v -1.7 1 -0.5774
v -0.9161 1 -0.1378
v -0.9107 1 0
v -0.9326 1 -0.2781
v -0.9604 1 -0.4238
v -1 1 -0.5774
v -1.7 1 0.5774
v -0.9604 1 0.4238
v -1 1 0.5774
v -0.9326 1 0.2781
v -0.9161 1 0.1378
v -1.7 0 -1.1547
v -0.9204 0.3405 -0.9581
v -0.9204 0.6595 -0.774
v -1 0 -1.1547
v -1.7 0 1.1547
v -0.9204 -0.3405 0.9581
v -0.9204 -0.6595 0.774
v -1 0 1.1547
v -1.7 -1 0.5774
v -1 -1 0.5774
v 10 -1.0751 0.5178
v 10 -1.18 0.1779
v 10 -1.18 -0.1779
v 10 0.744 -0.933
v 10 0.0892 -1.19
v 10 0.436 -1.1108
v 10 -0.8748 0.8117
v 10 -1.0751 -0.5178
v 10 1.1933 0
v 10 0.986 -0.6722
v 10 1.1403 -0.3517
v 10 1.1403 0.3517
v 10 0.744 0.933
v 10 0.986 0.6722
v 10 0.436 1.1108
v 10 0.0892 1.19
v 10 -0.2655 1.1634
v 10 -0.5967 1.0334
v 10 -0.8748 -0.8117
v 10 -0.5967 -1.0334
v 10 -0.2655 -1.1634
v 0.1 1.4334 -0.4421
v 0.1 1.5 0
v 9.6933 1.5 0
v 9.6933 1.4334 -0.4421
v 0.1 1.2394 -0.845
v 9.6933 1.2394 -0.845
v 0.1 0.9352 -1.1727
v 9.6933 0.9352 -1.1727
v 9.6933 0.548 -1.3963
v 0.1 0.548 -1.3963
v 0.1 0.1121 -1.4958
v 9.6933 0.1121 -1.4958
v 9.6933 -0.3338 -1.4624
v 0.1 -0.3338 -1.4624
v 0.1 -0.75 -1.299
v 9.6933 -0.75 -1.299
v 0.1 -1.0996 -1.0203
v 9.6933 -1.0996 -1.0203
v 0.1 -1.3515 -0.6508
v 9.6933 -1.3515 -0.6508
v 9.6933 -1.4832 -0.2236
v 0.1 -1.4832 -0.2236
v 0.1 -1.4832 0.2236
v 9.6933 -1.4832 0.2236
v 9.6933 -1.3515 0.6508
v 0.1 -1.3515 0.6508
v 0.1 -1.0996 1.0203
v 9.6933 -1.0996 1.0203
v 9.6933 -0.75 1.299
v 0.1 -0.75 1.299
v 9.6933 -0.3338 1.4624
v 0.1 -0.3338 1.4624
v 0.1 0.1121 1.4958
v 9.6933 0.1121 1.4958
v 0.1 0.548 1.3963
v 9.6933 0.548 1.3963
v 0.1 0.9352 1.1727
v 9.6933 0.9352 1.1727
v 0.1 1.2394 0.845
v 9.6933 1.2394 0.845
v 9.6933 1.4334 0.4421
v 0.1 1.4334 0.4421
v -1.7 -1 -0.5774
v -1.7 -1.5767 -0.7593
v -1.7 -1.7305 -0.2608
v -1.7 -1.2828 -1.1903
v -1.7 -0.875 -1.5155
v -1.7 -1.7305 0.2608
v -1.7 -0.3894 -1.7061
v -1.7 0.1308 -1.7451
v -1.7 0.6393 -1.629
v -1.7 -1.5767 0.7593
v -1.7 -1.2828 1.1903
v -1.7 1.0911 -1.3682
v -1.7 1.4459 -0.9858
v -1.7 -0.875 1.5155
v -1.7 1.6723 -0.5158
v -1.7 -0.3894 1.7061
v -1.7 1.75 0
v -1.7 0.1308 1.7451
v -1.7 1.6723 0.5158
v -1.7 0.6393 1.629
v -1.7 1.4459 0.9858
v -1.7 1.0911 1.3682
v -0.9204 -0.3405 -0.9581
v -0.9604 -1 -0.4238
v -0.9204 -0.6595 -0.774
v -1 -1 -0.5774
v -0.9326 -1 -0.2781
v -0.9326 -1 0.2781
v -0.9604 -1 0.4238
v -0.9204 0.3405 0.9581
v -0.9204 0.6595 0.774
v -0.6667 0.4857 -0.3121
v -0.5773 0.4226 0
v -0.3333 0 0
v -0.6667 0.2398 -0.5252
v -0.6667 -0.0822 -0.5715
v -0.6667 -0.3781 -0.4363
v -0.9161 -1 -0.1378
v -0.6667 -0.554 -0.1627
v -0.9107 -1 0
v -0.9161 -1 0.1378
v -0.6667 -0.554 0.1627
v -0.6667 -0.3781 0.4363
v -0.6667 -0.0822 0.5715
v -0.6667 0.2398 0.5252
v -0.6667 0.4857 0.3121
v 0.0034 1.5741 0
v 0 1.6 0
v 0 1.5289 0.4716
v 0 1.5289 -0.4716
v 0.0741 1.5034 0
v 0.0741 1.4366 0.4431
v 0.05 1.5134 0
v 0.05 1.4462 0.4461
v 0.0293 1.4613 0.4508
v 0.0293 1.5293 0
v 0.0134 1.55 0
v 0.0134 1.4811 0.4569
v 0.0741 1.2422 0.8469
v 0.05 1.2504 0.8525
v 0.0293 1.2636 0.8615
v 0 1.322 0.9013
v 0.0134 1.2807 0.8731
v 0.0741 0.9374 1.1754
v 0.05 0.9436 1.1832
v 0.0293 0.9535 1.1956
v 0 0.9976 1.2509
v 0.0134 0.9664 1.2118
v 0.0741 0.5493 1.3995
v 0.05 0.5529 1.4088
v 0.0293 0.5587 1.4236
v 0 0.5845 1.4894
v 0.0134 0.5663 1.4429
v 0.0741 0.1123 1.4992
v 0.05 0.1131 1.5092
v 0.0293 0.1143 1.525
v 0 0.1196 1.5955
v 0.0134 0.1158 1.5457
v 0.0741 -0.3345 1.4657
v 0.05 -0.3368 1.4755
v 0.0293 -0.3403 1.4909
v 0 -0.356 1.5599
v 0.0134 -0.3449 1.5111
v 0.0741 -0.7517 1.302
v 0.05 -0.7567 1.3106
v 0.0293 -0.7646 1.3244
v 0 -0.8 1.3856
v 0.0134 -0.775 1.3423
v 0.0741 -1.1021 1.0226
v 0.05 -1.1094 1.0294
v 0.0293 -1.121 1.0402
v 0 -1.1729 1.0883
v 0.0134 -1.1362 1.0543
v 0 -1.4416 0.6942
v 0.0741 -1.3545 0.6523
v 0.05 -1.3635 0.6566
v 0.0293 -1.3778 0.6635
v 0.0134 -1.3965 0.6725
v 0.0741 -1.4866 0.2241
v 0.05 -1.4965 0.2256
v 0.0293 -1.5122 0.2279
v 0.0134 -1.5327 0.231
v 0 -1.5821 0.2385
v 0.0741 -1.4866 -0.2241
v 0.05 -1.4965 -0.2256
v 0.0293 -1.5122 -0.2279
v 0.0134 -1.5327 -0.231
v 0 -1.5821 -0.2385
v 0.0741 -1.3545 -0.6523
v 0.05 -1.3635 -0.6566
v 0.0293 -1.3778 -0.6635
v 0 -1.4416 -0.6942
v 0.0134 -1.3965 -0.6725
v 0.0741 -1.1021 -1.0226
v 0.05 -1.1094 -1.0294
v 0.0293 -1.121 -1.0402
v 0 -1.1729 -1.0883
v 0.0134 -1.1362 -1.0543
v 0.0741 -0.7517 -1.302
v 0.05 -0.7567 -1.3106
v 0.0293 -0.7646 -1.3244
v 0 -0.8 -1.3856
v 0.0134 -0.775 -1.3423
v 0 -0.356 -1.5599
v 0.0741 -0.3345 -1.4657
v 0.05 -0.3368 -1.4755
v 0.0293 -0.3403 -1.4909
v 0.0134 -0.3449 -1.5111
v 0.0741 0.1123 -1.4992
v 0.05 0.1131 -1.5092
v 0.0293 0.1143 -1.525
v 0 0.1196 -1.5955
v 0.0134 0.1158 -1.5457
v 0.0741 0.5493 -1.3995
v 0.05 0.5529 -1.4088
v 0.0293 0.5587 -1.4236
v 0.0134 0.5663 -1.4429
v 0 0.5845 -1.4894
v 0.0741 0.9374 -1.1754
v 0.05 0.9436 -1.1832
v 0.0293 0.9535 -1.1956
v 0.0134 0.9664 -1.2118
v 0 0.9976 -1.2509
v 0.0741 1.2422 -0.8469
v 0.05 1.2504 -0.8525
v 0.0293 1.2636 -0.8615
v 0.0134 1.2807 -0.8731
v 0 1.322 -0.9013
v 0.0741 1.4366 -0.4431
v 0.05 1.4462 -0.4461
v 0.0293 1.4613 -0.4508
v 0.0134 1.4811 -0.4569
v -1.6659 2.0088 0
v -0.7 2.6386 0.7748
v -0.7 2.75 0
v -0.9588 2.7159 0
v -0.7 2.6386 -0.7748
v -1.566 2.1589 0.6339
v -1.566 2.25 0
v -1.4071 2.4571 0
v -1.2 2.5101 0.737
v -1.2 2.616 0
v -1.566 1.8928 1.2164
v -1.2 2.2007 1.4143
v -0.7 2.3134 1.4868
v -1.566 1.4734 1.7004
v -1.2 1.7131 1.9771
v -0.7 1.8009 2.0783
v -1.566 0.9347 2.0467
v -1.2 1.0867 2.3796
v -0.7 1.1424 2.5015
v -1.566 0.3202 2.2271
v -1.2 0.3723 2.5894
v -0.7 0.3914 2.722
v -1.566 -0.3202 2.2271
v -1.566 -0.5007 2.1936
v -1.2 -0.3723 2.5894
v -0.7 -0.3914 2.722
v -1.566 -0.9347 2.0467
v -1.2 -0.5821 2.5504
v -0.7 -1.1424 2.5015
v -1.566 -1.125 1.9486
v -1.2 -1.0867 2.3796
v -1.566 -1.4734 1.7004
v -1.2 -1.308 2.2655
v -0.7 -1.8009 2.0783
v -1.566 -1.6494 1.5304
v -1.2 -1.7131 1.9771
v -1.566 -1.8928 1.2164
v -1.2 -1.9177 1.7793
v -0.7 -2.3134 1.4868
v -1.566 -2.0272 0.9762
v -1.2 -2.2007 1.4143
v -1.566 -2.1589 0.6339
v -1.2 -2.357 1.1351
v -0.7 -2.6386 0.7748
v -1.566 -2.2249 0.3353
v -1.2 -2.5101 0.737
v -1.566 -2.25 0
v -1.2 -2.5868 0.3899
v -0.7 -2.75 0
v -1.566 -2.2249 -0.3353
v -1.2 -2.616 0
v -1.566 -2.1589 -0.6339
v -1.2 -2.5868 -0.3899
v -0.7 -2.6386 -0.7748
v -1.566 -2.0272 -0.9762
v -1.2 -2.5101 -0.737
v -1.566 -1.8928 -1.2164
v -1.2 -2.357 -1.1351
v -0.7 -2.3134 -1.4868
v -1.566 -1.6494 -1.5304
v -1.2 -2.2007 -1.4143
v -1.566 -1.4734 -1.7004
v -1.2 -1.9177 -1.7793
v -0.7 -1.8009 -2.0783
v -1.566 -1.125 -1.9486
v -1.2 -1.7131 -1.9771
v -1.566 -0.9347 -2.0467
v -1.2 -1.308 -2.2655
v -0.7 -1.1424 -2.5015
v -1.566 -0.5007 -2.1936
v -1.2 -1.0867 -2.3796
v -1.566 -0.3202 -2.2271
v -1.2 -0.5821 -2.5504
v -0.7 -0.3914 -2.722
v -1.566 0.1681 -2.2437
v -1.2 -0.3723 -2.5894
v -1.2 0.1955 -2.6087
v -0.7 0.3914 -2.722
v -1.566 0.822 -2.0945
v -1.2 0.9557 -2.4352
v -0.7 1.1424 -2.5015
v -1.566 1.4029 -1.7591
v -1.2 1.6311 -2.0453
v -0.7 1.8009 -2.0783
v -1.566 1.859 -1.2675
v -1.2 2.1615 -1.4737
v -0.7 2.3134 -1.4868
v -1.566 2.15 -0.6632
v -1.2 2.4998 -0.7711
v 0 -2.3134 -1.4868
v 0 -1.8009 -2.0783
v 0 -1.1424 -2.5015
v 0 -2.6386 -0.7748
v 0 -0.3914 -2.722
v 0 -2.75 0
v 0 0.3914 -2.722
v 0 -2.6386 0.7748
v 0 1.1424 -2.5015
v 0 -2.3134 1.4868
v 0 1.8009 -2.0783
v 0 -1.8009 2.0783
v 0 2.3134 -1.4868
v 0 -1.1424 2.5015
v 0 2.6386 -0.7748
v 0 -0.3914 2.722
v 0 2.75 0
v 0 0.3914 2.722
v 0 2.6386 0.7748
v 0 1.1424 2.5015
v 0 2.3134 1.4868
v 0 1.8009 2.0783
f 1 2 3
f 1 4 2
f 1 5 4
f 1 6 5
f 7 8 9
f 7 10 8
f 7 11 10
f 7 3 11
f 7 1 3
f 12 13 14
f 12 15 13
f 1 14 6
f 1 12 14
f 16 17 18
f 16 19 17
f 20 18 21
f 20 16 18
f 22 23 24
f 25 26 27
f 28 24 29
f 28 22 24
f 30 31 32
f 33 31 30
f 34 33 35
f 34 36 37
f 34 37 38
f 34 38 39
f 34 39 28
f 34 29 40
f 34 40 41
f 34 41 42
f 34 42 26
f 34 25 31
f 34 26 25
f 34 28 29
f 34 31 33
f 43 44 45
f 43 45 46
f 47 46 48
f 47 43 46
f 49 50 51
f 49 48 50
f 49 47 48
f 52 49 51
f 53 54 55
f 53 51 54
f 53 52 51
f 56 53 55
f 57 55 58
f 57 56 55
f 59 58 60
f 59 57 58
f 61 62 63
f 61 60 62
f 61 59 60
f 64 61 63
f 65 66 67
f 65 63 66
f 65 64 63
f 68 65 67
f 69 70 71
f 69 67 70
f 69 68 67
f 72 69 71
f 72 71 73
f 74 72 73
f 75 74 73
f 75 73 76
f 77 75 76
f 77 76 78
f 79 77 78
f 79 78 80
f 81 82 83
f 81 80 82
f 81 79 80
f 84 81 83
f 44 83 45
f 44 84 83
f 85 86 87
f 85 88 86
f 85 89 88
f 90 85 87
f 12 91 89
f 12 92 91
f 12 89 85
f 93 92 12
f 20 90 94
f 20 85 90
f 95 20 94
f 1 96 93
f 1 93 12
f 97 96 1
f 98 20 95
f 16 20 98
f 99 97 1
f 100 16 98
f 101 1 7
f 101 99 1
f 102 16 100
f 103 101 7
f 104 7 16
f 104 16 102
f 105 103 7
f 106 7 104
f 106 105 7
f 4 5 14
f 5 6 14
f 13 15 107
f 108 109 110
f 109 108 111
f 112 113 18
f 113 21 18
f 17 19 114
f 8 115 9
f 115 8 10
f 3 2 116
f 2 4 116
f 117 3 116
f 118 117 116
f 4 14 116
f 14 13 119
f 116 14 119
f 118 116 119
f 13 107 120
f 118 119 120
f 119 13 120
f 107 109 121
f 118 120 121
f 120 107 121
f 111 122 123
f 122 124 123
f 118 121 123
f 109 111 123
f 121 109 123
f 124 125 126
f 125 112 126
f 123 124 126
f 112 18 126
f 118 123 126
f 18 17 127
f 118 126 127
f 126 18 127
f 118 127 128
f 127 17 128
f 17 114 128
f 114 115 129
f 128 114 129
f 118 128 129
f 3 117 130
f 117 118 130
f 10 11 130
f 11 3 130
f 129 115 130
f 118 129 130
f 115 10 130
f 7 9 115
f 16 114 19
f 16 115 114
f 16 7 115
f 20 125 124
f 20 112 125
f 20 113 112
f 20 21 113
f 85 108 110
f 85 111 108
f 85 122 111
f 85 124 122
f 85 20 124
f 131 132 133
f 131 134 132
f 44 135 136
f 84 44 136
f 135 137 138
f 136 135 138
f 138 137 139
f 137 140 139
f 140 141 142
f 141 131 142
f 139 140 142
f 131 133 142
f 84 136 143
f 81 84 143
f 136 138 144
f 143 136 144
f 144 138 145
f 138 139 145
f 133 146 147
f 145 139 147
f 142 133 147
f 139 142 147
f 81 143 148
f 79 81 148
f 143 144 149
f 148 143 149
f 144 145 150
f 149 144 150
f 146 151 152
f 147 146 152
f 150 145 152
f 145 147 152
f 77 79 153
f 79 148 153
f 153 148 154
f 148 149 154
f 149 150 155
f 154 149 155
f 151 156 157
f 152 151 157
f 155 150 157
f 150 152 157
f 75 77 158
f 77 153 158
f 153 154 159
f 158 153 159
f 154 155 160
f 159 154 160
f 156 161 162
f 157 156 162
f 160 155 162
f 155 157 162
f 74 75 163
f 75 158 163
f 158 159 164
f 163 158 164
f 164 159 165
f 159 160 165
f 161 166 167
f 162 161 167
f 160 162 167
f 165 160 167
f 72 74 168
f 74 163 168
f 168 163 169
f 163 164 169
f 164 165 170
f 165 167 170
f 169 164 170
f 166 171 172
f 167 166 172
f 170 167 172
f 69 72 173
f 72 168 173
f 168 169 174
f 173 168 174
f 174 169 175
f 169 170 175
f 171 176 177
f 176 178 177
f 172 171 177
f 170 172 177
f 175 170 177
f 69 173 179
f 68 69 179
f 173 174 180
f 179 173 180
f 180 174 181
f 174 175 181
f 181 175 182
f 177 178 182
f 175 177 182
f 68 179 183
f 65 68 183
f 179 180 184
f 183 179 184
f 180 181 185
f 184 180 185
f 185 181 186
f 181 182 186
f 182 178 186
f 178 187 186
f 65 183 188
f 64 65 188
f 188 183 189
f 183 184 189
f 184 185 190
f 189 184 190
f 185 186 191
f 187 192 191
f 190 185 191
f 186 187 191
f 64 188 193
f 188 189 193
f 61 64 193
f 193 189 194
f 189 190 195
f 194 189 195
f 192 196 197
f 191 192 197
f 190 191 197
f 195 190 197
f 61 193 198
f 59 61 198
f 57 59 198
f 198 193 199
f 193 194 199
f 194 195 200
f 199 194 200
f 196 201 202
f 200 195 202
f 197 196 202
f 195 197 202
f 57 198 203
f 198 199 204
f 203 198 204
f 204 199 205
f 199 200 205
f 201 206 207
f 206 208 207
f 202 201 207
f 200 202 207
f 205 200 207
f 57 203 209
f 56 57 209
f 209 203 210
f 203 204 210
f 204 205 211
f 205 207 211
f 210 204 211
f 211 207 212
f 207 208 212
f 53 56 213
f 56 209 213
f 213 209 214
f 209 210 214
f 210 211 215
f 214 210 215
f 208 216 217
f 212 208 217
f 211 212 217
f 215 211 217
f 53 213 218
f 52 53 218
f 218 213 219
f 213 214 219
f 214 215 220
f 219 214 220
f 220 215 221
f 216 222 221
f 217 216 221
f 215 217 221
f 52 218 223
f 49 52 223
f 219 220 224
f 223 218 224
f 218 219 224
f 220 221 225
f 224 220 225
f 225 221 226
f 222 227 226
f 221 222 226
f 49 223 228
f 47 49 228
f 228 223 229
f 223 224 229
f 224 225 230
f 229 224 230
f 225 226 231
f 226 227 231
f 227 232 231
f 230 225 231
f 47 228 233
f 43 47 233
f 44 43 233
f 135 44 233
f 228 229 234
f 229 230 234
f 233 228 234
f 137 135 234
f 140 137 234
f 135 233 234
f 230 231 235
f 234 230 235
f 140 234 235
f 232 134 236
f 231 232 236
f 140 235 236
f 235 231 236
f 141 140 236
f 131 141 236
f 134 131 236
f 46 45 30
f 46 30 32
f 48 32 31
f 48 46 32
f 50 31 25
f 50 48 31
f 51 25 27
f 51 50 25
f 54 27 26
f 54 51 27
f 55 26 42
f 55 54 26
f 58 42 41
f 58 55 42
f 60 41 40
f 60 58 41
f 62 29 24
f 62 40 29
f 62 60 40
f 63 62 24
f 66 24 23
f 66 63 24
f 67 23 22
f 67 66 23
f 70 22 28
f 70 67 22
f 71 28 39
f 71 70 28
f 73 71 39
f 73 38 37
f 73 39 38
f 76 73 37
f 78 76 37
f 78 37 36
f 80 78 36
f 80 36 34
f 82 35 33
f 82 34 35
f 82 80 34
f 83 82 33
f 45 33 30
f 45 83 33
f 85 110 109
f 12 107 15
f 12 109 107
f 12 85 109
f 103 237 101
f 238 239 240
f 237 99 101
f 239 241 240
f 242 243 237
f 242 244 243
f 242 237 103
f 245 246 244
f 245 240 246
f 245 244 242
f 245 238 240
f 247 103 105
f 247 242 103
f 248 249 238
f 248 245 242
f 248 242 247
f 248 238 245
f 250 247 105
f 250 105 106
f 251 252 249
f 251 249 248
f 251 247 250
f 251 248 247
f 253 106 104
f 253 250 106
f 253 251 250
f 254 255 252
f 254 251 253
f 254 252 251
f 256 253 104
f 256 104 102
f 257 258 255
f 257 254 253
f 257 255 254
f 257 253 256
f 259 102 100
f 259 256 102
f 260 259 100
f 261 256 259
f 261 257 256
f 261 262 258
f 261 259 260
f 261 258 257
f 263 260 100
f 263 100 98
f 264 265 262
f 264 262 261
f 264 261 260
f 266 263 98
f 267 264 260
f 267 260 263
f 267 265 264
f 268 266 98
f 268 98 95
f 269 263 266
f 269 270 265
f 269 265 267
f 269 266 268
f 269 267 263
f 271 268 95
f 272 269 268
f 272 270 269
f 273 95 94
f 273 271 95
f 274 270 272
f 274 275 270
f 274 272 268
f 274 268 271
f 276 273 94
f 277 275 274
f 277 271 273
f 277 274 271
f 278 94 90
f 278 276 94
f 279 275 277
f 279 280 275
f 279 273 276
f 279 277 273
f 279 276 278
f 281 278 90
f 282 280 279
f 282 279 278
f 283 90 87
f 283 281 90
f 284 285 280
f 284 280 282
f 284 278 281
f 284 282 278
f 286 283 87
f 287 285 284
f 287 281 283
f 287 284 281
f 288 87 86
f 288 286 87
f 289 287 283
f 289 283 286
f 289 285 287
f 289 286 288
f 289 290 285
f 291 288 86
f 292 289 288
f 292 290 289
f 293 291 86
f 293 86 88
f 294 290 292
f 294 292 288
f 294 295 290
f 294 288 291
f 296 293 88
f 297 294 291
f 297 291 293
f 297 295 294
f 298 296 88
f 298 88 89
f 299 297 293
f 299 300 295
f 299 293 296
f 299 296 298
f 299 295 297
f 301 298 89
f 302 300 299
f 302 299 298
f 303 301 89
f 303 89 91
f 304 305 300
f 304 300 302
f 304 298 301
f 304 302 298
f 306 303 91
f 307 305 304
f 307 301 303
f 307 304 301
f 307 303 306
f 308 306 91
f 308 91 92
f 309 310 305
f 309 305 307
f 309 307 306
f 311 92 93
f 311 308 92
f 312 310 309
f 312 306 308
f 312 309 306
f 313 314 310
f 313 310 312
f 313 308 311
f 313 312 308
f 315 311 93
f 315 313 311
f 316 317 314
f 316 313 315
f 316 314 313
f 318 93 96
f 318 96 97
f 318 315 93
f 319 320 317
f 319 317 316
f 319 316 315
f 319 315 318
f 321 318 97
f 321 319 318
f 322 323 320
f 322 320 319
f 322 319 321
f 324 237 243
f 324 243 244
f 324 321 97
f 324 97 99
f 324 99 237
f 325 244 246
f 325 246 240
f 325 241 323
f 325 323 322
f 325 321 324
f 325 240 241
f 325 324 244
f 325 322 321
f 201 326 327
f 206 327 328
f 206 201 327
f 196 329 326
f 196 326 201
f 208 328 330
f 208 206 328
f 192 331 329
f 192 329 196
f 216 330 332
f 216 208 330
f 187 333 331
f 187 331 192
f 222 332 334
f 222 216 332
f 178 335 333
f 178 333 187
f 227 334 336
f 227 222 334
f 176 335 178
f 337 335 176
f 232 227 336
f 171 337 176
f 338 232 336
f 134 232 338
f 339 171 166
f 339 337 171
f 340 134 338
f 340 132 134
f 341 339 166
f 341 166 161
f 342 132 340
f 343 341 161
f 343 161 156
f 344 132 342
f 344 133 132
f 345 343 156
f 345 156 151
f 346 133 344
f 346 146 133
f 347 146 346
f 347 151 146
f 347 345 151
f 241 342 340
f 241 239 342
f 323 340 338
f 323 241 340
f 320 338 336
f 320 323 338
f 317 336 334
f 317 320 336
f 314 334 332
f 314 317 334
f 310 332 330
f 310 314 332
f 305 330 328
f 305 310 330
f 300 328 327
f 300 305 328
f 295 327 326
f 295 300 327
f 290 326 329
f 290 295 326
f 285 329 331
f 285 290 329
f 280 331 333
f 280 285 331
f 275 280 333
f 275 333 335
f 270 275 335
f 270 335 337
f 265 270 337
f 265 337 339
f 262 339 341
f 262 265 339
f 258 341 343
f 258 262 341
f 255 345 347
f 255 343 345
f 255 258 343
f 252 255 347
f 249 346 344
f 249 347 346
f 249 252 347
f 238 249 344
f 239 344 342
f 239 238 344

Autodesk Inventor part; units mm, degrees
ref_plane "YZ Plane" through (0, 0, 0) normal (1, 0, 0) x (0, 1, 0)
ref_plane "XZ Plane" through (0, 0, 0) normal (0, 1, 0) x (-1, 0, 0)
sketch "Sketch1" plane through (0, 0, 0) normal (0, 0, 1) x (1, 0, 0)
  line L0 (-0.3333, 0) -> (10, 0)
  line L1 (10, 0) -> (10, 1.5)
  line L2 (10, 1.5) -> (7, 1.5)
  line L3 (7, 1.5) -> (6.6932, 1.5)
  line L4 (6.6932, 1.5) -> (0, 1.5)
  line L5 (0, 1.5) -> (0, 2.75)
  line L6 (0, 2.75) -> (-1.7, 2.75)
  line L7 (-1.7, 2.75) -> (-1.7, 1.1547)
  line L8 (-1.7, 1.1547) -> (-1, 1.1547)
  line L9 (-1, 1.1547) -> (-0.3333, 0)
  line L10 (-4.04, 0) -> (12.34, 0) projected
  line L11 (0, -0.55) -> (0, 3.3) projected
  line L12 (7, 1.5) -> (0, 1.5) construction
  dimension "d1" = 3
  dimension "d2" = 0.3068
  dimension "d3" = 1.7
  dimension "d4" = 0.7
  dimension "d5" = 60
  dimension "d6" = 3
  dimension "d7" = 3
  dimension "d8" = 2.3094
  dimension "d9" = 5.5
  dimension "d26" = 10
revolve "Body" add sketch "Sketch1" angle 360 about axis through (-0.3333, 0, 0) along (1, 0, 0)
sketch "Sketch2" plane through (-1.7, 0, 0) normal (-1, 0, 0) x (0, 0, 1)
  circle A0 centre (0, 0) radius 1.1547 projected
  line L0 (0, -3.85) -> (0, 3.85) projected
  line L1 (-3.85, 0) -> (3.85, 0) projected
  line L2 (1.1547, 0) -> (0.5774, -1)
  line L3 (0.5774, -1) -> (-0.5774, -1)
  line L4 (-0.5774, -1) -> (-1.1547, 0)
  line L5 (-1.1547, 0) -> (-0.5774, 1)
  line L6 (-0.5774, 1) -> (0.5774, 1)
  line L7 (0.5774, 1) -> (1.1547, 0)
extrude "Slot" add sketch "Sketch2" against normal up to next contours L7 A0 | A0 L2 | L6 L0 A0 | A0 L0 L3 | L0 L6 A0 | A0 L3 L0 | L4 A0 | A0 L5
fillet "Fillet1" radius 1 1 edges at (-1.7, -2.75, 0)
chamfer "Chamfer1" distance 0.3067 distance2 0.3067 1 edges at (10, -1.5, 0) measured on face at (10, -0.3743, 0.5709)
ref_plane "Work Plane1" through (29, 0, 0) normal (0, -1, 0) x (1, 0, 0)
fillet "Fillet2" radius 0.1 1 edges at (0, -1.5, 0)
thread "Thread2" size "M3x0.5" class "6g" standard "ANSI Metric M Profile" full length
equation "\"d15\" = -0.5 * SPD + 0.5 * GD"
equation "\"d16\" = GUL"
equation "\"GD\" = NND"
equation "\"NLG\" = 6"
equation "\"GEL\" = 4.5"
equation "\"KOD\" = 5.7"
equation "\"KOH\" = 1.65"
equation "\"INTI\" = 1.04"
equation "\"GAL\" = 0.61345 * PTC"
equation "\"GUL\" = 0.61345 * PTC"
equation "\"BDM\" = NND"
equation "\"SW\" = 2"
equation "\"RR\" = 1.45"
equation "\"SPD\" = NND - 1.2269 * PTC"
equation "\"R\" = 0.3"
equation "\"TOA\" = 30deg"
equation "\"GD1\" = THREADDIA - 1.2269 * PTC"
equation "\"THREADDIA\" = 3"
equation "\"PTC\" = 0.5"
equation "\"NND\" = 3"
equation "\"KOH1\" = 0.2"
equation "\"E0\" = 2.303"
properties part number "M3x10 Bolt" material "Stainless Steel"
